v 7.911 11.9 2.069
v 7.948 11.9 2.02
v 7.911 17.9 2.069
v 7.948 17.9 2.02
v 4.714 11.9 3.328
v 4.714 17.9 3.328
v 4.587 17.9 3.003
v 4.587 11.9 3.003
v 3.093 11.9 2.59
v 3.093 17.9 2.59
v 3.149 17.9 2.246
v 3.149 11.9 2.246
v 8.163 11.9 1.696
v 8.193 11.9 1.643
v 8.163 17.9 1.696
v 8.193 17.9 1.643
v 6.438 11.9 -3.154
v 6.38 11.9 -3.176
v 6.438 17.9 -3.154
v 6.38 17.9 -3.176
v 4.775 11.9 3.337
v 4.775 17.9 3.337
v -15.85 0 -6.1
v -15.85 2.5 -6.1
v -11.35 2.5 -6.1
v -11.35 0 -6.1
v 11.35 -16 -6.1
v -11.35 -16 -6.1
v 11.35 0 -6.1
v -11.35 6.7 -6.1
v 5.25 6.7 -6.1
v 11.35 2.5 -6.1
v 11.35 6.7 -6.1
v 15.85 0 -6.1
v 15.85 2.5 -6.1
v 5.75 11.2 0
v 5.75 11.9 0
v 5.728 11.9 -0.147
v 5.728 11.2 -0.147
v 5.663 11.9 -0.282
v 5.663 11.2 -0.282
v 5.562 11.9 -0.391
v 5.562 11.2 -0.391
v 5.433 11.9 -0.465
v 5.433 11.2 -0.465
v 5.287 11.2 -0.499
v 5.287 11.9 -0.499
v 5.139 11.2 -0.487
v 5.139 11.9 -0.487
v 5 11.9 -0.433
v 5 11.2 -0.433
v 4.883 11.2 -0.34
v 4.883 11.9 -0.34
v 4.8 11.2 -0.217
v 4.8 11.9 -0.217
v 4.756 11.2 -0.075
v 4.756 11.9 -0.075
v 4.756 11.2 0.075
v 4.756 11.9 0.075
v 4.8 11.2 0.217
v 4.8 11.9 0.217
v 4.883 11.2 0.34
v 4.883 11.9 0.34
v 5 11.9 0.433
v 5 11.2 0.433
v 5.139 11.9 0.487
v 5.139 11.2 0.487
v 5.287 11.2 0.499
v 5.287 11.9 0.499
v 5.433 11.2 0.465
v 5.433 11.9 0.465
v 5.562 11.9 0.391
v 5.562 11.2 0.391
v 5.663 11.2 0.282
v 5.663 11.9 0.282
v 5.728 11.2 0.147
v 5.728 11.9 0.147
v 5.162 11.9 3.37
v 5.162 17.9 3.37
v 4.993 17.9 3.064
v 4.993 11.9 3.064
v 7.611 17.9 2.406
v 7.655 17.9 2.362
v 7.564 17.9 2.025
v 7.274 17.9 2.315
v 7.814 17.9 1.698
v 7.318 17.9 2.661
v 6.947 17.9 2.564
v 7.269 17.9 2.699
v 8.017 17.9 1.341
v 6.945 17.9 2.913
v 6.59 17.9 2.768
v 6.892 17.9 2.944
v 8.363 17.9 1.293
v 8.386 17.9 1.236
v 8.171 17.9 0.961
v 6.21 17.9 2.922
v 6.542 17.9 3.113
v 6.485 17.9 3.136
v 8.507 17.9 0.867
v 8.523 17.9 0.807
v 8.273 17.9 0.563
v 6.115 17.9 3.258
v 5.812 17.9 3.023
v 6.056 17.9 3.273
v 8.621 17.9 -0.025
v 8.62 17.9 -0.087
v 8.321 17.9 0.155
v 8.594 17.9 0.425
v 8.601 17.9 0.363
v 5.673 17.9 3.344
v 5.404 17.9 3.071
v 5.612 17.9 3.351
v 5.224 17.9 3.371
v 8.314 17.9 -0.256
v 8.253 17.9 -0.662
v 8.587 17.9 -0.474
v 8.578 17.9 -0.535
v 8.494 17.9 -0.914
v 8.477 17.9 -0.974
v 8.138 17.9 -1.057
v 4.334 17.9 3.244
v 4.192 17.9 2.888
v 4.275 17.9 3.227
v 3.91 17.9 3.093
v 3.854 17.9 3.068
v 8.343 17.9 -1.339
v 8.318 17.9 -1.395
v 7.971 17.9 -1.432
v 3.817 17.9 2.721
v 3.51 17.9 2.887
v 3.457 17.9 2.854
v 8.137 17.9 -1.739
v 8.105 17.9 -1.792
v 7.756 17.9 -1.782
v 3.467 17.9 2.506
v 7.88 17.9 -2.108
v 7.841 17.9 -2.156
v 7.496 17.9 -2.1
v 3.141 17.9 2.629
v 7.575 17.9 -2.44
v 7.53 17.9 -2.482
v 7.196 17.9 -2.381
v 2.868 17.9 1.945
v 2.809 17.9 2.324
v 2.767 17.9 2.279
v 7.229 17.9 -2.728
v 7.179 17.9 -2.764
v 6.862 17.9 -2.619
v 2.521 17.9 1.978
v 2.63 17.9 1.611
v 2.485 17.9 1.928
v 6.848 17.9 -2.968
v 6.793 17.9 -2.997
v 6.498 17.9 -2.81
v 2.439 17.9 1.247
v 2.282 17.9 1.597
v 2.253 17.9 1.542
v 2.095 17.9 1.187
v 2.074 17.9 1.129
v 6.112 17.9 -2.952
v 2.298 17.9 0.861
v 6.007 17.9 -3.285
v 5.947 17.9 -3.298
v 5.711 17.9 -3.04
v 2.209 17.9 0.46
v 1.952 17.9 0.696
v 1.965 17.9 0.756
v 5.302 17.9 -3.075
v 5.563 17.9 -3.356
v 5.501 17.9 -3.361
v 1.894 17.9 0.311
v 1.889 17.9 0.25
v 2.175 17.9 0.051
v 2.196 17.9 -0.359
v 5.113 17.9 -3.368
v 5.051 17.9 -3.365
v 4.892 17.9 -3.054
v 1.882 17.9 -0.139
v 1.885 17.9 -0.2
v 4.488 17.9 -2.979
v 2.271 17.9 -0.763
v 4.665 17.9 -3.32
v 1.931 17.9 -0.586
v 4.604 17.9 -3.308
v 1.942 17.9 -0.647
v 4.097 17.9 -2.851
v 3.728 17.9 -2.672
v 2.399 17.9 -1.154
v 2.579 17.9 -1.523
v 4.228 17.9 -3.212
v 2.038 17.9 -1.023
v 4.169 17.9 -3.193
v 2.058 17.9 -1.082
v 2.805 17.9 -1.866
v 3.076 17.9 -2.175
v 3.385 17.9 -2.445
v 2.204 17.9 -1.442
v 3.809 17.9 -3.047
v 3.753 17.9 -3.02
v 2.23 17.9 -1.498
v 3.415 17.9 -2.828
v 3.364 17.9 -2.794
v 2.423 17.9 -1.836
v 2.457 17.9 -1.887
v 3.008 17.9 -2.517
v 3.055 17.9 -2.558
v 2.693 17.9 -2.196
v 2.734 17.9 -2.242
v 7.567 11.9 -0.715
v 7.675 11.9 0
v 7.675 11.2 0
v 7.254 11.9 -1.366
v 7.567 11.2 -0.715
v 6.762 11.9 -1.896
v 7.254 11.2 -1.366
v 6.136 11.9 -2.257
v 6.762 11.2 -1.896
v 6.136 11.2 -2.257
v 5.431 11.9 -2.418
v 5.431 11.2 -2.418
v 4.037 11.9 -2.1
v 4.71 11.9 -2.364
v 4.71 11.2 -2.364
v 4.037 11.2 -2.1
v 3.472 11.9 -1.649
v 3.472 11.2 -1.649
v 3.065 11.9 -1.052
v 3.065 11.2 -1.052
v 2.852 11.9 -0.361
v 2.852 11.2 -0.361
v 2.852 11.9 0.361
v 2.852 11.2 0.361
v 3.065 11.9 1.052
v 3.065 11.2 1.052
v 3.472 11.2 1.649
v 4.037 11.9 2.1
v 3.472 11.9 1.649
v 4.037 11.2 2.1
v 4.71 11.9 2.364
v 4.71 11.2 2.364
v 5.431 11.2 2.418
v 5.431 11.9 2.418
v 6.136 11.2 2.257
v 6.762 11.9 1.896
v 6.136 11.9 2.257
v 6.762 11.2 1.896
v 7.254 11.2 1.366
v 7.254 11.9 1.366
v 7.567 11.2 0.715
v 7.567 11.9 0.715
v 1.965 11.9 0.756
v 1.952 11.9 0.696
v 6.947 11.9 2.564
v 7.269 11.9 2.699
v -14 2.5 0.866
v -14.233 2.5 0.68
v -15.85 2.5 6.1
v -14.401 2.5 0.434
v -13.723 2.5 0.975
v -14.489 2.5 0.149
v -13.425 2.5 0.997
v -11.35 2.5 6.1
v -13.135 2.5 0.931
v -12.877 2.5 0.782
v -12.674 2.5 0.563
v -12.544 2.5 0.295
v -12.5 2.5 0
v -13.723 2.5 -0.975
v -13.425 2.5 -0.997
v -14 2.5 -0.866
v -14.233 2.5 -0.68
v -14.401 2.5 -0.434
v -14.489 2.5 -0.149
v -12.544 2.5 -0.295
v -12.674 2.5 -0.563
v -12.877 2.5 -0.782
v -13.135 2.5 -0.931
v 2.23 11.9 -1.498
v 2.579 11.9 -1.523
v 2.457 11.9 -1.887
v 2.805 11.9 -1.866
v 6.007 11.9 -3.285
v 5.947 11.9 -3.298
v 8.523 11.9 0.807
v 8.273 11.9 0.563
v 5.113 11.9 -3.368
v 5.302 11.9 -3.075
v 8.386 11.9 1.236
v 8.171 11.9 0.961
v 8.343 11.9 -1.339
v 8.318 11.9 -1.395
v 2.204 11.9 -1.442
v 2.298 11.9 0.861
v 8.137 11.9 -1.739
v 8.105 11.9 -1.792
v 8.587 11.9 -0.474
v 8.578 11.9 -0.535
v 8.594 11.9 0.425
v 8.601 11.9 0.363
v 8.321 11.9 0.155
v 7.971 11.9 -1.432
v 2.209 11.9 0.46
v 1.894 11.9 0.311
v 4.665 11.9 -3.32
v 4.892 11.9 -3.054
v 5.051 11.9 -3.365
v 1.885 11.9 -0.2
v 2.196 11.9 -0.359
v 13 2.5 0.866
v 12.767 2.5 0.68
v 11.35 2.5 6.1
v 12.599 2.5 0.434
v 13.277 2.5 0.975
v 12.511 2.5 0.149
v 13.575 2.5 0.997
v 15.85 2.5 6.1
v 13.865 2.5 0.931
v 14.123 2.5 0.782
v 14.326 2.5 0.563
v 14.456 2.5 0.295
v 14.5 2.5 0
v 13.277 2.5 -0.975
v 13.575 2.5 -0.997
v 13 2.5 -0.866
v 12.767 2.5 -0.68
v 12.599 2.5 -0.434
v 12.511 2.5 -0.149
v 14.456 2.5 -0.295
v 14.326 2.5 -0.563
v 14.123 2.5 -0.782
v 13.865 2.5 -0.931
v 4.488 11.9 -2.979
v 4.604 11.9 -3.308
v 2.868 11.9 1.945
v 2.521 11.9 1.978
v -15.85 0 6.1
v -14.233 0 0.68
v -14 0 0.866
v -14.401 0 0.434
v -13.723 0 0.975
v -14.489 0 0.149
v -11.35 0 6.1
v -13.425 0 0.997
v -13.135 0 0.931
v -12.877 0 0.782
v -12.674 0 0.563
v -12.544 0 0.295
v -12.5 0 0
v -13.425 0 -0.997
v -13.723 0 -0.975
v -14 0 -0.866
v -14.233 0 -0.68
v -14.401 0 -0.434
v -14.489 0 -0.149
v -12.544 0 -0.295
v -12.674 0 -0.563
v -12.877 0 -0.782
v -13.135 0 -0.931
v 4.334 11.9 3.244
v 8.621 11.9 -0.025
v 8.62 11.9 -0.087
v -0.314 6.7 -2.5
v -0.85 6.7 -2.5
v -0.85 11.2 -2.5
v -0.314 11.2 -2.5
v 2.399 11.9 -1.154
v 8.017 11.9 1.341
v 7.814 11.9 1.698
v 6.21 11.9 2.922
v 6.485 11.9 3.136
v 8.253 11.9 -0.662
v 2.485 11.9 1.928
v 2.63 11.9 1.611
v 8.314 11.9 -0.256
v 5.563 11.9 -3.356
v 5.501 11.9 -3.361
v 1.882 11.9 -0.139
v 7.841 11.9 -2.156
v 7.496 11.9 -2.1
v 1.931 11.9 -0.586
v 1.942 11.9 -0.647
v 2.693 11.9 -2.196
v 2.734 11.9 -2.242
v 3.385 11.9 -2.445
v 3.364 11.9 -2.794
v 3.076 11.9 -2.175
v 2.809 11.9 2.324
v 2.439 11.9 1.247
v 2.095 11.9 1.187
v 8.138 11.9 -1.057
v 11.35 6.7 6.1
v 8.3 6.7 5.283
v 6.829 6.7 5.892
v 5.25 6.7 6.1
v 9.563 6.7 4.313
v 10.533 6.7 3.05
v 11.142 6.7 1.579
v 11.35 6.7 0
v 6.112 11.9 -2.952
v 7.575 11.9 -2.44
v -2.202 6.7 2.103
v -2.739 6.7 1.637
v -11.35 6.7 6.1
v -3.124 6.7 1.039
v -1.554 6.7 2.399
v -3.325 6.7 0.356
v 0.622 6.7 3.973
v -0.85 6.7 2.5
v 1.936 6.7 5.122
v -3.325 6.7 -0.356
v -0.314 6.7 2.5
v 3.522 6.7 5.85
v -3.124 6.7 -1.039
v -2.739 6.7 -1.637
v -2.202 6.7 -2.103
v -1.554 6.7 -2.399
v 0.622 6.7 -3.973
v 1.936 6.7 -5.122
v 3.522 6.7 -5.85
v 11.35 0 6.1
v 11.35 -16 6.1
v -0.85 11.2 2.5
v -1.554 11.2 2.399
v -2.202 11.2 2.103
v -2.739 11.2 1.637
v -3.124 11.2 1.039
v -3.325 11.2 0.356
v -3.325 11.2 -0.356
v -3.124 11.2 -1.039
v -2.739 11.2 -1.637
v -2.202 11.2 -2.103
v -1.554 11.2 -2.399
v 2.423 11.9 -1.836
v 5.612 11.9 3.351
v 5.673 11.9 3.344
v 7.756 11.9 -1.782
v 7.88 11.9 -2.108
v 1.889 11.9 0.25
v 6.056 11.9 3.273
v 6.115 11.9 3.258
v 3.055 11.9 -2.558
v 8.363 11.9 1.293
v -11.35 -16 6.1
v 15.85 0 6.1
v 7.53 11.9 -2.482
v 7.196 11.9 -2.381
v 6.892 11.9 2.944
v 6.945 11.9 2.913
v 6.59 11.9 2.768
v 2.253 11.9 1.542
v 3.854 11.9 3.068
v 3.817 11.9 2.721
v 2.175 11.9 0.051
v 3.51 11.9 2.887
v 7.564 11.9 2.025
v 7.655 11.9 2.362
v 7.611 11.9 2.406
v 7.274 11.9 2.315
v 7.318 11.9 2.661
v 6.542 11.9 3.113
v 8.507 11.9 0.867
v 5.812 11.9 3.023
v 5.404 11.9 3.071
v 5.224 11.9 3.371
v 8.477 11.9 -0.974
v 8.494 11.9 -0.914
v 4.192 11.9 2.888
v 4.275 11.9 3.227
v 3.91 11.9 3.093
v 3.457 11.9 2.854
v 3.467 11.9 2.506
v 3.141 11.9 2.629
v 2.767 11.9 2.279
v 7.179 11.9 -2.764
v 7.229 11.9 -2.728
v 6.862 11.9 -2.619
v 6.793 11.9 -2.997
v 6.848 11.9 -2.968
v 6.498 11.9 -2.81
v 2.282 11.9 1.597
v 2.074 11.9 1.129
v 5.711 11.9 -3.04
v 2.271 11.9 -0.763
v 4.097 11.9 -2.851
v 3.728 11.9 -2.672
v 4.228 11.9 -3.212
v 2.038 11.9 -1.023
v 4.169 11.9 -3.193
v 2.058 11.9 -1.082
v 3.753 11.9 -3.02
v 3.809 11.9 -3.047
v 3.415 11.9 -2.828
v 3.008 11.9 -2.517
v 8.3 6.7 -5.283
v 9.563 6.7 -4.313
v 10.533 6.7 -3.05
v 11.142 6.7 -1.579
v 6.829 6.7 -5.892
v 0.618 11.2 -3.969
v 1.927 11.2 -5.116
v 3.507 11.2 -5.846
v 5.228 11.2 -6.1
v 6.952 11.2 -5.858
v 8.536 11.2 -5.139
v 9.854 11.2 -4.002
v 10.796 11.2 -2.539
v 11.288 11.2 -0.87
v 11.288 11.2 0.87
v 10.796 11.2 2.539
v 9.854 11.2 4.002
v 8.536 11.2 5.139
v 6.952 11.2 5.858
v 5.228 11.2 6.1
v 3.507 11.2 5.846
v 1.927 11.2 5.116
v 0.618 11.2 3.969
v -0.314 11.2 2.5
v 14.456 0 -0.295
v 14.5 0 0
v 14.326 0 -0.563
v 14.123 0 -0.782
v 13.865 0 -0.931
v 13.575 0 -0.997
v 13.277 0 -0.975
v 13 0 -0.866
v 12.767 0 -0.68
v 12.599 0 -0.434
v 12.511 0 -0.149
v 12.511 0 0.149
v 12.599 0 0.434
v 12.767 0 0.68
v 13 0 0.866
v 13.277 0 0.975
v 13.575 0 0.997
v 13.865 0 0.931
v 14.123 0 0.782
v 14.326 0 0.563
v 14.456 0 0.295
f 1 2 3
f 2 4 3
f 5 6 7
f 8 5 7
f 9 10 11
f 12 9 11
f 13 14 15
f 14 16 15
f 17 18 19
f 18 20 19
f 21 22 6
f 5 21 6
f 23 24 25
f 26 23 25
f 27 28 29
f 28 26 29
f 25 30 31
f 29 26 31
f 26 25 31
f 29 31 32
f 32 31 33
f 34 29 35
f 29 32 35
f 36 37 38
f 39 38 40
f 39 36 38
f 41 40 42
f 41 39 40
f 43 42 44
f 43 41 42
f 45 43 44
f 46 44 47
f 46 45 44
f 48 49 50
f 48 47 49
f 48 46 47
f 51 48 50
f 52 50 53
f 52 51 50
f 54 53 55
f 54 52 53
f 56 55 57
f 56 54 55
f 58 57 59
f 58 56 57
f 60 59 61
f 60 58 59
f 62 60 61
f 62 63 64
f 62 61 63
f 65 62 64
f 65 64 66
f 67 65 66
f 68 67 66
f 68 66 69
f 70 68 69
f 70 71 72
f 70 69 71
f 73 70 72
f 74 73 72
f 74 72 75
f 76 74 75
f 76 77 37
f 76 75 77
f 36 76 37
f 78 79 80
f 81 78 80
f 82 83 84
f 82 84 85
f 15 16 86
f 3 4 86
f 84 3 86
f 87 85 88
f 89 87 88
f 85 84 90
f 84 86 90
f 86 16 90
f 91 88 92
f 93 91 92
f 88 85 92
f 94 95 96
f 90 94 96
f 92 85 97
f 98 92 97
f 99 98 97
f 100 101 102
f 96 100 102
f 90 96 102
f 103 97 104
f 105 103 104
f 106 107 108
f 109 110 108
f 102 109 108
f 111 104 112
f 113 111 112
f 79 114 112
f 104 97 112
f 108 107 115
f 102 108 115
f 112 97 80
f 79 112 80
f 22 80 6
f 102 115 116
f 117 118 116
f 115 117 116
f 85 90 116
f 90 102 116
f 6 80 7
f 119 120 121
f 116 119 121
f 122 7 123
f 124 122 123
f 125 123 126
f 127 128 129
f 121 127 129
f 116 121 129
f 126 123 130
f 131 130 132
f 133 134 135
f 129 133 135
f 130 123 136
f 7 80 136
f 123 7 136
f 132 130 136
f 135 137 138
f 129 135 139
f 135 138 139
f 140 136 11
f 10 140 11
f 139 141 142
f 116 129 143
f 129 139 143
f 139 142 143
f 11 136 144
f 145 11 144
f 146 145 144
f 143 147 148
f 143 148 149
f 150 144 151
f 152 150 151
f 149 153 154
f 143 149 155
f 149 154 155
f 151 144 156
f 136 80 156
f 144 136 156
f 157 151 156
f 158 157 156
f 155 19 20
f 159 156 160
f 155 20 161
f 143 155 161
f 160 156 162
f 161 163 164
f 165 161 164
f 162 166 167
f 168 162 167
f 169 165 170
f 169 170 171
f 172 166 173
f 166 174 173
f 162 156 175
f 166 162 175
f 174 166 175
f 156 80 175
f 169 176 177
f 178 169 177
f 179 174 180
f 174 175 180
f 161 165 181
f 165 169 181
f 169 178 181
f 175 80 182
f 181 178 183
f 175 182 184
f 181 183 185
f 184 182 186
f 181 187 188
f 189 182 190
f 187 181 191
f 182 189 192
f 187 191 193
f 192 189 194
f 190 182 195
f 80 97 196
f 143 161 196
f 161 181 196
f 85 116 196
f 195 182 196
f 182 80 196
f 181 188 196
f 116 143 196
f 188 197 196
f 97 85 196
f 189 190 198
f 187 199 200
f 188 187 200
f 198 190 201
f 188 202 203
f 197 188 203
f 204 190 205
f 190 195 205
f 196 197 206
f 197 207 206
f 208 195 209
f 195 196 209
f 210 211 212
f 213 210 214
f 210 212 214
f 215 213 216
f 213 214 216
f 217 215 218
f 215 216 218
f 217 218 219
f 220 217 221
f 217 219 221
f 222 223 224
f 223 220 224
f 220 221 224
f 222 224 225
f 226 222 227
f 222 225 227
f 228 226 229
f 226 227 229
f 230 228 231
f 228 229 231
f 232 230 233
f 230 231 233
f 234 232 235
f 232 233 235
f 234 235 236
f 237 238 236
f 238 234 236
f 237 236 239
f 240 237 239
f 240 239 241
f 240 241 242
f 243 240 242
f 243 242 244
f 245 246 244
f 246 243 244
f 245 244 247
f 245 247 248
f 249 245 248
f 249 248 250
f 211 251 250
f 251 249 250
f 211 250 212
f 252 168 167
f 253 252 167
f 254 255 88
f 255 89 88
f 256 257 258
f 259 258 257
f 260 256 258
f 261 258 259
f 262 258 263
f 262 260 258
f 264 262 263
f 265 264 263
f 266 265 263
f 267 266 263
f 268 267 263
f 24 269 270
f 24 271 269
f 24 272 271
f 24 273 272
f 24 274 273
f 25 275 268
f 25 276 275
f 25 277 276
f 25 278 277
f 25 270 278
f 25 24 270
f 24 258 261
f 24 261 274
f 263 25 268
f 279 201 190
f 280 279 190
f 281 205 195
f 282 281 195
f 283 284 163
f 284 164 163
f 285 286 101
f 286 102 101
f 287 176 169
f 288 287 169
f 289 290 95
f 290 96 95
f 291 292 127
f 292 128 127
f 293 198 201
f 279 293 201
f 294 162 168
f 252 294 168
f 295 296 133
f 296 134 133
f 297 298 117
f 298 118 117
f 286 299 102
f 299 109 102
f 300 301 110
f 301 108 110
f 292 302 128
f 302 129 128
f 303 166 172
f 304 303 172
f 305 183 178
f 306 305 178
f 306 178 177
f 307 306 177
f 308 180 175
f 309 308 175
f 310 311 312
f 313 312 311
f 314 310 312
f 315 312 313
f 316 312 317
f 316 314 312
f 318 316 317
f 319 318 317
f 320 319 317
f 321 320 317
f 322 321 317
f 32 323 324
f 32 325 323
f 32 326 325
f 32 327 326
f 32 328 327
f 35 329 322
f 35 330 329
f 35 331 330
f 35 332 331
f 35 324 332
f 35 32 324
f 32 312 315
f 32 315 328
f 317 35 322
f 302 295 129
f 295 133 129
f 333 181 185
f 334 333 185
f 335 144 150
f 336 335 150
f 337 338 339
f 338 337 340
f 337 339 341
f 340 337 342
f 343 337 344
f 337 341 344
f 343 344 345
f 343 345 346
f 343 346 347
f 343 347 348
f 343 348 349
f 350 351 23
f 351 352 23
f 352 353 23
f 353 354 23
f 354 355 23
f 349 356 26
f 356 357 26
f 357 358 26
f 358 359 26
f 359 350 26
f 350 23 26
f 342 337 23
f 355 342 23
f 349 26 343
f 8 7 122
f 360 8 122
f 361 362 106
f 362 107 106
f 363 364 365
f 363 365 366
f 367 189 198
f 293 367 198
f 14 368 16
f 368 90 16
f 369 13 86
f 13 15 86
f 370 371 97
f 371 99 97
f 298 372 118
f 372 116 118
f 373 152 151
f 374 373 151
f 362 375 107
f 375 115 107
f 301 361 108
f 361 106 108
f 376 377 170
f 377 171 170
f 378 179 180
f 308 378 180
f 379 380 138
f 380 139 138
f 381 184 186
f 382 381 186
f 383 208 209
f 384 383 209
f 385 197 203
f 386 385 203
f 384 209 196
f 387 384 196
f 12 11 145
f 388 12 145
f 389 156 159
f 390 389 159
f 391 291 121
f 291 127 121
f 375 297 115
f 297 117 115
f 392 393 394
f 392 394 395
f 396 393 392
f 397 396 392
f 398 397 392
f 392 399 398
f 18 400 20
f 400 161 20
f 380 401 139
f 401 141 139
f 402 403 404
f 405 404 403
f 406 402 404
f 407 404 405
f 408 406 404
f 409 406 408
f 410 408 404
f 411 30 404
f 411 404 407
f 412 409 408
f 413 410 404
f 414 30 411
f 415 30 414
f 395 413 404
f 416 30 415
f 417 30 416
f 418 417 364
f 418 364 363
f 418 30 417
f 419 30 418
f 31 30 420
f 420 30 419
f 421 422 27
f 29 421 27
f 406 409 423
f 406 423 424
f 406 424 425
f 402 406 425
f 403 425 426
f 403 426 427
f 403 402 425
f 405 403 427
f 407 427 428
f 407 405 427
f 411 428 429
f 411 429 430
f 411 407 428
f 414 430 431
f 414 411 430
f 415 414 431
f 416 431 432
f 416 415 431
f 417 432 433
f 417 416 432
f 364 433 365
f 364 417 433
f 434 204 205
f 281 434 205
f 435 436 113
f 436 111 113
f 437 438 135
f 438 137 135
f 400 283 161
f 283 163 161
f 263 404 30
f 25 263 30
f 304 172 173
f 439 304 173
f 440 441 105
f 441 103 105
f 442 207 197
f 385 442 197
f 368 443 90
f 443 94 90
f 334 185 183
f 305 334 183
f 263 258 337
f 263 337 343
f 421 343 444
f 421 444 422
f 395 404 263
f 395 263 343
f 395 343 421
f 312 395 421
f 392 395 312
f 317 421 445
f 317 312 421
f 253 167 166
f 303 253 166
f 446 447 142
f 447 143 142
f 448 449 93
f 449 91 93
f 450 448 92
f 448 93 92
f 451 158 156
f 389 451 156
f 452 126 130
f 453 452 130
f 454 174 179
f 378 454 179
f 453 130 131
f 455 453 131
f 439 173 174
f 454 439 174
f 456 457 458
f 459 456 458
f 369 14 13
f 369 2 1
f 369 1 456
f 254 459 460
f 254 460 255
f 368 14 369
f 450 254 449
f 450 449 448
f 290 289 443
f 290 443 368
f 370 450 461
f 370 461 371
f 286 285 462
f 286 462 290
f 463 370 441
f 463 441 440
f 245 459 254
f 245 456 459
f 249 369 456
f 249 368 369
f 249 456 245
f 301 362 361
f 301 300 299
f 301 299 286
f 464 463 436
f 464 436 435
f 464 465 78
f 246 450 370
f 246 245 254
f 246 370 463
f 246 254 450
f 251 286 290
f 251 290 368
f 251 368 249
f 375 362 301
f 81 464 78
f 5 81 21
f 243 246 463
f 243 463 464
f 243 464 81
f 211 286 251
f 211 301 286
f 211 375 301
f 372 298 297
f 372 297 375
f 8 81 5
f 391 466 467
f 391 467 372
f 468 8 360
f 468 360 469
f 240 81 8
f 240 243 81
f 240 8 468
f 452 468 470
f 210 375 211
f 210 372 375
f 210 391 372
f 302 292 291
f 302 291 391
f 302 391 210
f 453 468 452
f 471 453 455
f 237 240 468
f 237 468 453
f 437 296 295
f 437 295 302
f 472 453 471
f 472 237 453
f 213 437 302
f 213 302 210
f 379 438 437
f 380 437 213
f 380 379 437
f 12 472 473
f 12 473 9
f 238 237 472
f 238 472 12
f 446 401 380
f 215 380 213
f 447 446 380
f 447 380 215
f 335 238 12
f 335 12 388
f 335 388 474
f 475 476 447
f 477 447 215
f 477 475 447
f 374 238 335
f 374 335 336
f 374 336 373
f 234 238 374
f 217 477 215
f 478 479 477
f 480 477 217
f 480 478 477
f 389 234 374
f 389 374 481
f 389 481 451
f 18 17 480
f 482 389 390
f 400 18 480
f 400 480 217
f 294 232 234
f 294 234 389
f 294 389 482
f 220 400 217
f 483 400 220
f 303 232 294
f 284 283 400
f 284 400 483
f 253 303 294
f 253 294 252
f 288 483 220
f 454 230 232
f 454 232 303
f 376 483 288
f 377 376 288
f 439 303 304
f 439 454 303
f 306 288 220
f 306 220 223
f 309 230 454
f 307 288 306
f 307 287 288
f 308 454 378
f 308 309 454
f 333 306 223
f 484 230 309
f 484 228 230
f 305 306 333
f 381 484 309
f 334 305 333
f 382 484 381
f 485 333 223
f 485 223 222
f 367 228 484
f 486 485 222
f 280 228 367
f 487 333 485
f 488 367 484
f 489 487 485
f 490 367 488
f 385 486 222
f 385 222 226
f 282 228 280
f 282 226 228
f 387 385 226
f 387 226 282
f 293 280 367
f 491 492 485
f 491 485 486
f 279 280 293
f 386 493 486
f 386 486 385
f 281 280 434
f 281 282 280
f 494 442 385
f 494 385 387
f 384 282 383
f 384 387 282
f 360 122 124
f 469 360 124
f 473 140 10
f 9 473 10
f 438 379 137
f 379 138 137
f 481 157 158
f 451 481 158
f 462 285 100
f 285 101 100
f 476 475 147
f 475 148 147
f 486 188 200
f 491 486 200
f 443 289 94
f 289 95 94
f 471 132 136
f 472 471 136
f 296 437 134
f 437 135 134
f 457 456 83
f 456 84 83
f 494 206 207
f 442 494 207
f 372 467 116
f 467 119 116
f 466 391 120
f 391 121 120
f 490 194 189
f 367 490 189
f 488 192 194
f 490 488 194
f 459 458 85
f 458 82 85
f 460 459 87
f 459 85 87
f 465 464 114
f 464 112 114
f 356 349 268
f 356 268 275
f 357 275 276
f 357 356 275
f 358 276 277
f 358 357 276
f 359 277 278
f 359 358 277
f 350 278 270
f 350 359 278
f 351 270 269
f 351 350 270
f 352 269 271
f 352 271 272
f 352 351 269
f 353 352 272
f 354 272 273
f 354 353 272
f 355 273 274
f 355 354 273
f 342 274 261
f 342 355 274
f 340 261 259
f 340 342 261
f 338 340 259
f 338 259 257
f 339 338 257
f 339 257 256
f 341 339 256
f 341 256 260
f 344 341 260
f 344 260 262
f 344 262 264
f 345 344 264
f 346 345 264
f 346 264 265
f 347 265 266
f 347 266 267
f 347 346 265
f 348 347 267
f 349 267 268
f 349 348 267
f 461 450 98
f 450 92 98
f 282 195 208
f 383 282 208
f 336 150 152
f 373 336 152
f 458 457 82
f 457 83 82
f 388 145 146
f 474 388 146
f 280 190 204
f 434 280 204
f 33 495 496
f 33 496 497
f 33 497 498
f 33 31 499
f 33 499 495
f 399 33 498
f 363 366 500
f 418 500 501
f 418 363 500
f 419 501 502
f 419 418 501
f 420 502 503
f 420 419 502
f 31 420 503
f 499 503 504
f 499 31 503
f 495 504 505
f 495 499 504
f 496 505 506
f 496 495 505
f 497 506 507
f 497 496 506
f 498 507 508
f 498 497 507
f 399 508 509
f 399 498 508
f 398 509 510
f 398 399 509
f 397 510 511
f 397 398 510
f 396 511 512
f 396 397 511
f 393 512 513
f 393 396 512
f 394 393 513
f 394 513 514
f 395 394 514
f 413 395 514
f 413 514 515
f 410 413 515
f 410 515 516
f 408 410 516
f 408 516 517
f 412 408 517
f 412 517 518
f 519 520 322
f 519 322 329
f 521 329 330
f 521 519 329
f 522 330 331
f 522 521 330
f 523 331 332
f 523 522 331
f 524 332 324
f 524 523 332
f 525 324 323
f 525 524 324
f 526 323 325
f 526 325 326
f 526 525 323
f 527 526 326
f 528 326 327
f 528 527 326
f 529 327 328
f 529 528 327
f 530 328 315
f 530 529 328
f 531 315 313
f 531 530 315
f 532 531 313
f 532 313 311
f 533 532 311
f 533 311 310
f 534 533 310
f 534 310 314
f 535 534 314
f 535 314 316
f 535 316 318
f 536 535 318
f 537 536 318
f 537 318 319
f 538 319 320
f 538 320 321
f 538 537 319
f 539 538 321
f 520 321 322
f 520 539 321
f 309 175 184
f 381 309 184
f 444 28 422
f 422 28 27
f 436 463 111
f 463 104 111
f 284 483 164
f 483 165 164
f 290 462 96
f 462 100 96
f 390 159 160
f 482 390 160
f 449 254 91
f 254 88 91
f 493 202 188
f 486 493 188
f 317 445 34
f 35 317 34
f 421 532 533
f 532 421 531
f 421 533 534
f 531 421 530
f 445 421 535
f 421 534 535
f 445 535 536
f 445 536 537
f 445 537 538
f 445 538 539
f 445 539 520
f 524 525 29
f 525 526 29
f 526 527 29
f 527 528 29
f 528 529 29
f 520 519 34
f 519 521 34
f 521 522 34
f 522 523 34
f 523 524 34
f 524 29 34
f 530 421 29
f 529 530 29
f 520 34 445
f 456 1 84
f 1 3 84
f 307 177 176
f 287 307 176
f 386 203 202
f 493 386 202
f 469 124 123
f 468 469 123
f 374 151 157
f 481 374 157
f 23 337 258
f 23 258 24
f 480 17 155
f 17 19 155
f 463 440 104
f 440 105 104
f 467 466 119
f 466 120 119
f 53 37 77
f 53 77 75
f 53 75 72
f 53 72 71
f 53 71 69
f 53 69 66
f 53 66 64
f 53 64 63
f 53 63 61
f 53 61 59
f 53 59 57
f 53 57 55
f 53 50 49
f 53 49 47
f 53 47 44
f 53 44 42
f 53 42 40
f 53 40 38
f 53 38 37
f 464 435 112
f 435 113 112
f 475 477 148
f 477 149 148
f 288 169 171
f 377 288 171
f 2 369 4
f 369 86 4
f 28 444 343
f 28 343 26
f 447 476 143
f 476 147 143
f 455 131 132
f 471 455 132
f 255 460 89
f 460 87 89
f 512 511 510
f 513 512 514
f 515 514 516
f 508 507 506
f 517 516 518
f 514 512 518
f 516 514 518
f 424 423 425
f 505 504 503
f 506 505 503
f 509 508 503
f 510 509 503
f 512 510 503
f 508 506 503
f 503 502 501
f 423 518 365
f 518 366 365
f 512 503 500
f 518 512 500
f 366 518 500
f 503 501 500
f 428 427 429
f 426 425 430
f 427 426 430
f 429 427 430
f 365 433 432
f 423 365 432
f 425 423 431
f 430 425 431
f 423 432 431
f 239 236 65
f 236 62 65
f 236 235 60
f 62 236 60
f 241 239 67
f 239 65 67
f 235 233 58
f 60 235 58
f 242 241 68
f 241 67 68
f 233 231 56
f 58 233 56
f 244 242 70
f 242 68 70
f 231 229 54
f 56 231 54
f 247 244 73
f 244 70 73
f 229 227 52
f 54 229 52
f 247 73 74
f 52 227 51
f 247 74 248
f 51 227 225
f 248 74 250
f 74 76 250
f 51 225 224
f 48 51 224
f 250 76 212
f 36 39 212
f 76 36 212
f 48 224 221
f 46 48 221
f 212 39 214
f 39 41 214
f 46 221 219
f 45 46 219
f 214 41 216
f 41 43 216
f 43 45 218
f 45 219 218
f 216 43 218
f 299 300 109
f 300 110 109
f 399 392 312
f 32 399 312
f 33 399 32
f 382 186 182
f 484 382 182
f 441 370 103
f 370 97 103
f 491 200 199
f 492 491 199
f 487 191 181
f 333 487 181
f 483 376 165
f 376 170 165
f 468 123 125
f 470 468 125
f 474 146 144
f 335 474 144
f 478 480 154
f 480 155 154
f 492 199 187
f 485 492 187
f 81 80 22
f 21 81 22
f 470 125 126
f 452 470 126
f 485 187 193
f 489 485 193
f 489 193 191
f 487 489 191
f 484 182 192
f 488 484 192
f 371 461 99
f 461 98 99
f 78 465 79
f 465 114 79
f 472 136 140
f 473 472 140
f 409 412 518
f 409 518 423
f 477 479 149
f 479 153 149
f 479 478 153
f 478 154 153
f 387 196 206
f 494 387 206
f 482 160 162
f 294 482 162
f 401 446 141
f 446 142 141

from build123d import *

# Parameters (mm, degrees)
SKETCH2_W                = 22.7
SKETCH2_H                = 12.2
BOSS_EXTRUDE1_DEPTH      = 6.7
BOSS_EXTRUDE1_DEPTH_BACK = 16
SKETCH3_W                = 4.5
SKETCH3_H                = 12.2
SKETCH3_R                = 1
BOSS_EXTRUDE2_DEPTH      = 2.5
BOSS_EXTRUDE3_DEPTH      = 4.5
SKETCH5_R                = 2.425
SKETCH5_R_2              = 0.5
BOSS_EXTRUDE4_DEPTH      = 2.7
BOSS_EXTRUDE5_DEPTH      = 4
BOSS_EXTRUDE5_DEPTH_BACK = 2


with BuildPart() as part:
    # Sketch2 → Boss-Extrude1 (new body, two sides)
    with BuildSketch(Plane(origin=(0, 0, 0), x_dir=(1, 0, 0), z_dir=(0, 1, 0))) as boss_extrude1_sk:
        Rectangle(SKETCH2_W, SKETCH2_H)
    extrude(amount=BOSS_EXTRUDE1_DEPTH)
    extrude(boss_extrude1_sk.sketch, amount=-BOSS_EXTRUDE1_DEPTH_BACK)

    # Sketch3 → Boss-Extrude2 (add)
    with BuildSketch(Plane(origin=(0, 0, 0), x_dir=(1, 0, 0), z_dir=(0, 1, 0))):
        with Locations((13.6, 0)):
            Rectangle(SKETCH3_W, SKETCH3_H)
        with Locations((13.5, 0)):
            Circle(SKETCH3_R, mode=Mode.SUBTRACT)
        with Locations((-13.6, 0)):
            Rectangle(SKETCH3_W, SKETCH3_H)
        with Locations((-13.5, 0)):
            Circle(SKETCH3_R, mode=Mode.SUBTRACT)
    extrude(amount=BOSS_EXTRUDE2_DEPTH)

    # Sketch4 → Boss-Extrude3 (add)
    with BuildSketch(Plane(origin=(0, 6.7, 0), x_dir=(1, 0, 0), z_dir=(0, 1, 0))):
        with BuildLine():
            Line((-0.85, 2.5), (-0.314171097, 2.5))
            ThreePointArc((-0.314171097, 2.5), (11.35, 0), (-0.314171097, -2.5))
            Line((-0.314171097, -2.5), (-0.85, -2.5))
            ThreePointArc((-0.85, -2.5), (-3.35, 0), (-0.85, 2.5))
        make_face()
    extrude(amount=BOSS_EXTRUDE3_DEPTH)


with BuildPart() as body_2:
    # Sketch5 → Boss-Extrude4 (new body)
    with BuildSketch(Plane(origin=(0, 11.2, 0), x_dir=(1, 0, 0), z_dir=(0, 1, 0))):
        with Locations((5.25, 0)):
            Circle(SKETCH5_R)
        with Locations((5.25, 0)):
            Circle(SKETCH5_R_2, mode=Mode.SUBTRACT)
    extrude(amount=BOSS_EXTRUDE4_DEPTH)

    # Sketch6 → Boss-Extrude5 (add, two sides)
    with BuildSketch(Plane(origin=(0, 13.9, 0), x_dir=(1, 0, 0), z_dir=(0, 1, 0))) as boss_extrude5_sk:
        Polygon((5.301910888, 3.074698231), (5.501095267, 3.36131865), (5.562636503, 3.356154096), (5.711264879, 3.040345155), (5.946874795, 3.297859521), (6.007178562, 3.284538404), (6.112387586, 2.951737048), (6.380218576, 3.175550011), (6.438208751, 3.154310046), (6.498120967, 2.810455124), (6.79339358, 2.996572735), (6.848035326, 2.967792951), (6.8615816, 2.619020561), (7.179026689, 2.764121548), (7.229344924, 2.72831552), (7.19628352, 2.380849514), (7.530236271, 2.482344547), (7.575333064, 2.440151234), (7.496253966, 2.100192151), (7.840754983, 2.156270048), (7.879825581, 2.108442391), (7.756139956, 1.78205681), (8.105041611, 1.791716859), (8.137388798, 1.739108344), (7.971303819, 1.432120622), (8.318379953, 1.395190441), (8.343426493, 1.338739867), (8.137905951, 1.056628209), (8.476962983, 0.973766816), (8.49426192, 0.914481546), (8.252973332, 0.662280239), (8.577960781, 0.534966299), (8.587203415, 0.47390428), (8.314452584, 0.256113864), (8.619571041, 0.086619295), (8.620592437, 0.024870181), (8.321246607, -0.15462287), (8.601051226, -0.363273431), (8.593833157, -0.424607728), (8.273234161, -0.562600355), (8.522731822, -0.806683535), (8.507403094, -0.866508501), (8.17127203, -0.960538224), (8.386010441, -1.235698352), (8.362844597, -1.292946409), (8.01717973, -1.341335265), (8.193326879, -1.642662102), (8.162737314, -1.696311659), (7.813707043, -1.698196146), (7.94811958, -2.020312509), (7.910652164, -2.069406186), (7.564484942, -2.024752677), (7.654764273, -2.361910391), (7.611087614, -2.405572111), (7.273960803, -2.315177448), (7.318495891, -2.661359925), (7.269389399, -2.698810545), (6.947319036, -2.564287823), (6.94531515, -2.913317429), (6.891655132, -2.943888641), (6.59038857, -2.767638421), (6.54188147, -3.113286715), (6.484625491, -3.136432974), (6.209538838, -2.921600446), (6.115394135, -3.257699325), (6.055563929, -3.273007586), (5.811566113, -3.023426442), (5.673463821, -3.343978214), (5.612127059, -3.351175301), (5.403572228, -3.071299321), (5.223976785, -3.370583732), (5.162228023, -3.369541212), (4.992837842, -3.064364791), (4.774954134, -3.337041104), (4.713895281, -3.327777581), (4.586692521, -3.002746599), (4.334408688, -3.243948898), (4.275129339, -3.226629681), (4.192383938, -2.887544323), (3.91020199, -3.092968347), (3.853759988, -3.067902497), (3.816948539, -2.72081375), (3.50990402, -2.886793703), (3.457306573, -2.85442852), (3.467085976, -2.50553019), (3.140658103, -2.629104156), (3.092843814, -2.590017199), (3.149039557, -2.245535386), (2.809053443, -2.324498184), (2.766875559, -2.27938696), (2.868484827, -1.945468949), (2.521007532, -1.978411487), (2.485218718, -1.928081006), (2.630428291, -1.610685573), (2.281660556, -1.597019989), (2.252899465, -1.542368401), (2.439118075, -1.247159474), (2.095283668, -1.187129633), (2.074063542, -1.129132196), (2.297968113, -0.861377785), (1.965202767, -0.756054919), (1.95190228, -0.695746599), (2.20949723, -0.460224789), (1.893739151, -0.311488388), (1.88859565, -0.249945389), (2.175284191, -0.050859071), (1.882168089, 0.138636661), (1.88527336, 0.200316104), (2.195939529, 0.359414228), (1.930696068, 0.586287735), (1.941994697, 0.64700295), (2.271094648, 0.763273772), (2.038457104, 1.023476491), (2.057747467, 1.082144014), (2.399408403, 1.153512678), (2.203528199, 1.442401284), (2.230466059, 1.497974192), (2.578591033, 1.523167122), (2.422963655, 1.835586393), (2.457068306, 1.887072985), (2.80544502, 1.865640613), (2.692847642, 2.196015419), (2.733510485, 2.242496916), (3.075922148, 2.174821703), (3.008364073, 2.517256497), (3.054859478, 2.557903437), (3.385195746, 2.445193049), (3.363882551, 2.793577074), (3.415380807, 2.82766411), (3.727746821, 2.671929866), (3.753058839, 3.020046202), (3.808640959, 3.04696505), (4.09746254, 2.850986032), (4.168948077, 3.192622534), (4.227622196, 3.211892826), (4.487745317, 2.979166284), (4.604128713, 3.308226441), (4.66484779, 3.319504299), (4.891630547, 3.054183244), (5.050834937, 3.364794968), (5.112515439, 3.367879139), align=None)
    extrude(amount=BOSS_EXTRUDE5_DEPTH)
    extrude(boss_extrude5_sk.sketch, amount=-BOSS_EXTRUDE5_DEPTH_BACK)


solid = Compound([part.part, body_2.part])
